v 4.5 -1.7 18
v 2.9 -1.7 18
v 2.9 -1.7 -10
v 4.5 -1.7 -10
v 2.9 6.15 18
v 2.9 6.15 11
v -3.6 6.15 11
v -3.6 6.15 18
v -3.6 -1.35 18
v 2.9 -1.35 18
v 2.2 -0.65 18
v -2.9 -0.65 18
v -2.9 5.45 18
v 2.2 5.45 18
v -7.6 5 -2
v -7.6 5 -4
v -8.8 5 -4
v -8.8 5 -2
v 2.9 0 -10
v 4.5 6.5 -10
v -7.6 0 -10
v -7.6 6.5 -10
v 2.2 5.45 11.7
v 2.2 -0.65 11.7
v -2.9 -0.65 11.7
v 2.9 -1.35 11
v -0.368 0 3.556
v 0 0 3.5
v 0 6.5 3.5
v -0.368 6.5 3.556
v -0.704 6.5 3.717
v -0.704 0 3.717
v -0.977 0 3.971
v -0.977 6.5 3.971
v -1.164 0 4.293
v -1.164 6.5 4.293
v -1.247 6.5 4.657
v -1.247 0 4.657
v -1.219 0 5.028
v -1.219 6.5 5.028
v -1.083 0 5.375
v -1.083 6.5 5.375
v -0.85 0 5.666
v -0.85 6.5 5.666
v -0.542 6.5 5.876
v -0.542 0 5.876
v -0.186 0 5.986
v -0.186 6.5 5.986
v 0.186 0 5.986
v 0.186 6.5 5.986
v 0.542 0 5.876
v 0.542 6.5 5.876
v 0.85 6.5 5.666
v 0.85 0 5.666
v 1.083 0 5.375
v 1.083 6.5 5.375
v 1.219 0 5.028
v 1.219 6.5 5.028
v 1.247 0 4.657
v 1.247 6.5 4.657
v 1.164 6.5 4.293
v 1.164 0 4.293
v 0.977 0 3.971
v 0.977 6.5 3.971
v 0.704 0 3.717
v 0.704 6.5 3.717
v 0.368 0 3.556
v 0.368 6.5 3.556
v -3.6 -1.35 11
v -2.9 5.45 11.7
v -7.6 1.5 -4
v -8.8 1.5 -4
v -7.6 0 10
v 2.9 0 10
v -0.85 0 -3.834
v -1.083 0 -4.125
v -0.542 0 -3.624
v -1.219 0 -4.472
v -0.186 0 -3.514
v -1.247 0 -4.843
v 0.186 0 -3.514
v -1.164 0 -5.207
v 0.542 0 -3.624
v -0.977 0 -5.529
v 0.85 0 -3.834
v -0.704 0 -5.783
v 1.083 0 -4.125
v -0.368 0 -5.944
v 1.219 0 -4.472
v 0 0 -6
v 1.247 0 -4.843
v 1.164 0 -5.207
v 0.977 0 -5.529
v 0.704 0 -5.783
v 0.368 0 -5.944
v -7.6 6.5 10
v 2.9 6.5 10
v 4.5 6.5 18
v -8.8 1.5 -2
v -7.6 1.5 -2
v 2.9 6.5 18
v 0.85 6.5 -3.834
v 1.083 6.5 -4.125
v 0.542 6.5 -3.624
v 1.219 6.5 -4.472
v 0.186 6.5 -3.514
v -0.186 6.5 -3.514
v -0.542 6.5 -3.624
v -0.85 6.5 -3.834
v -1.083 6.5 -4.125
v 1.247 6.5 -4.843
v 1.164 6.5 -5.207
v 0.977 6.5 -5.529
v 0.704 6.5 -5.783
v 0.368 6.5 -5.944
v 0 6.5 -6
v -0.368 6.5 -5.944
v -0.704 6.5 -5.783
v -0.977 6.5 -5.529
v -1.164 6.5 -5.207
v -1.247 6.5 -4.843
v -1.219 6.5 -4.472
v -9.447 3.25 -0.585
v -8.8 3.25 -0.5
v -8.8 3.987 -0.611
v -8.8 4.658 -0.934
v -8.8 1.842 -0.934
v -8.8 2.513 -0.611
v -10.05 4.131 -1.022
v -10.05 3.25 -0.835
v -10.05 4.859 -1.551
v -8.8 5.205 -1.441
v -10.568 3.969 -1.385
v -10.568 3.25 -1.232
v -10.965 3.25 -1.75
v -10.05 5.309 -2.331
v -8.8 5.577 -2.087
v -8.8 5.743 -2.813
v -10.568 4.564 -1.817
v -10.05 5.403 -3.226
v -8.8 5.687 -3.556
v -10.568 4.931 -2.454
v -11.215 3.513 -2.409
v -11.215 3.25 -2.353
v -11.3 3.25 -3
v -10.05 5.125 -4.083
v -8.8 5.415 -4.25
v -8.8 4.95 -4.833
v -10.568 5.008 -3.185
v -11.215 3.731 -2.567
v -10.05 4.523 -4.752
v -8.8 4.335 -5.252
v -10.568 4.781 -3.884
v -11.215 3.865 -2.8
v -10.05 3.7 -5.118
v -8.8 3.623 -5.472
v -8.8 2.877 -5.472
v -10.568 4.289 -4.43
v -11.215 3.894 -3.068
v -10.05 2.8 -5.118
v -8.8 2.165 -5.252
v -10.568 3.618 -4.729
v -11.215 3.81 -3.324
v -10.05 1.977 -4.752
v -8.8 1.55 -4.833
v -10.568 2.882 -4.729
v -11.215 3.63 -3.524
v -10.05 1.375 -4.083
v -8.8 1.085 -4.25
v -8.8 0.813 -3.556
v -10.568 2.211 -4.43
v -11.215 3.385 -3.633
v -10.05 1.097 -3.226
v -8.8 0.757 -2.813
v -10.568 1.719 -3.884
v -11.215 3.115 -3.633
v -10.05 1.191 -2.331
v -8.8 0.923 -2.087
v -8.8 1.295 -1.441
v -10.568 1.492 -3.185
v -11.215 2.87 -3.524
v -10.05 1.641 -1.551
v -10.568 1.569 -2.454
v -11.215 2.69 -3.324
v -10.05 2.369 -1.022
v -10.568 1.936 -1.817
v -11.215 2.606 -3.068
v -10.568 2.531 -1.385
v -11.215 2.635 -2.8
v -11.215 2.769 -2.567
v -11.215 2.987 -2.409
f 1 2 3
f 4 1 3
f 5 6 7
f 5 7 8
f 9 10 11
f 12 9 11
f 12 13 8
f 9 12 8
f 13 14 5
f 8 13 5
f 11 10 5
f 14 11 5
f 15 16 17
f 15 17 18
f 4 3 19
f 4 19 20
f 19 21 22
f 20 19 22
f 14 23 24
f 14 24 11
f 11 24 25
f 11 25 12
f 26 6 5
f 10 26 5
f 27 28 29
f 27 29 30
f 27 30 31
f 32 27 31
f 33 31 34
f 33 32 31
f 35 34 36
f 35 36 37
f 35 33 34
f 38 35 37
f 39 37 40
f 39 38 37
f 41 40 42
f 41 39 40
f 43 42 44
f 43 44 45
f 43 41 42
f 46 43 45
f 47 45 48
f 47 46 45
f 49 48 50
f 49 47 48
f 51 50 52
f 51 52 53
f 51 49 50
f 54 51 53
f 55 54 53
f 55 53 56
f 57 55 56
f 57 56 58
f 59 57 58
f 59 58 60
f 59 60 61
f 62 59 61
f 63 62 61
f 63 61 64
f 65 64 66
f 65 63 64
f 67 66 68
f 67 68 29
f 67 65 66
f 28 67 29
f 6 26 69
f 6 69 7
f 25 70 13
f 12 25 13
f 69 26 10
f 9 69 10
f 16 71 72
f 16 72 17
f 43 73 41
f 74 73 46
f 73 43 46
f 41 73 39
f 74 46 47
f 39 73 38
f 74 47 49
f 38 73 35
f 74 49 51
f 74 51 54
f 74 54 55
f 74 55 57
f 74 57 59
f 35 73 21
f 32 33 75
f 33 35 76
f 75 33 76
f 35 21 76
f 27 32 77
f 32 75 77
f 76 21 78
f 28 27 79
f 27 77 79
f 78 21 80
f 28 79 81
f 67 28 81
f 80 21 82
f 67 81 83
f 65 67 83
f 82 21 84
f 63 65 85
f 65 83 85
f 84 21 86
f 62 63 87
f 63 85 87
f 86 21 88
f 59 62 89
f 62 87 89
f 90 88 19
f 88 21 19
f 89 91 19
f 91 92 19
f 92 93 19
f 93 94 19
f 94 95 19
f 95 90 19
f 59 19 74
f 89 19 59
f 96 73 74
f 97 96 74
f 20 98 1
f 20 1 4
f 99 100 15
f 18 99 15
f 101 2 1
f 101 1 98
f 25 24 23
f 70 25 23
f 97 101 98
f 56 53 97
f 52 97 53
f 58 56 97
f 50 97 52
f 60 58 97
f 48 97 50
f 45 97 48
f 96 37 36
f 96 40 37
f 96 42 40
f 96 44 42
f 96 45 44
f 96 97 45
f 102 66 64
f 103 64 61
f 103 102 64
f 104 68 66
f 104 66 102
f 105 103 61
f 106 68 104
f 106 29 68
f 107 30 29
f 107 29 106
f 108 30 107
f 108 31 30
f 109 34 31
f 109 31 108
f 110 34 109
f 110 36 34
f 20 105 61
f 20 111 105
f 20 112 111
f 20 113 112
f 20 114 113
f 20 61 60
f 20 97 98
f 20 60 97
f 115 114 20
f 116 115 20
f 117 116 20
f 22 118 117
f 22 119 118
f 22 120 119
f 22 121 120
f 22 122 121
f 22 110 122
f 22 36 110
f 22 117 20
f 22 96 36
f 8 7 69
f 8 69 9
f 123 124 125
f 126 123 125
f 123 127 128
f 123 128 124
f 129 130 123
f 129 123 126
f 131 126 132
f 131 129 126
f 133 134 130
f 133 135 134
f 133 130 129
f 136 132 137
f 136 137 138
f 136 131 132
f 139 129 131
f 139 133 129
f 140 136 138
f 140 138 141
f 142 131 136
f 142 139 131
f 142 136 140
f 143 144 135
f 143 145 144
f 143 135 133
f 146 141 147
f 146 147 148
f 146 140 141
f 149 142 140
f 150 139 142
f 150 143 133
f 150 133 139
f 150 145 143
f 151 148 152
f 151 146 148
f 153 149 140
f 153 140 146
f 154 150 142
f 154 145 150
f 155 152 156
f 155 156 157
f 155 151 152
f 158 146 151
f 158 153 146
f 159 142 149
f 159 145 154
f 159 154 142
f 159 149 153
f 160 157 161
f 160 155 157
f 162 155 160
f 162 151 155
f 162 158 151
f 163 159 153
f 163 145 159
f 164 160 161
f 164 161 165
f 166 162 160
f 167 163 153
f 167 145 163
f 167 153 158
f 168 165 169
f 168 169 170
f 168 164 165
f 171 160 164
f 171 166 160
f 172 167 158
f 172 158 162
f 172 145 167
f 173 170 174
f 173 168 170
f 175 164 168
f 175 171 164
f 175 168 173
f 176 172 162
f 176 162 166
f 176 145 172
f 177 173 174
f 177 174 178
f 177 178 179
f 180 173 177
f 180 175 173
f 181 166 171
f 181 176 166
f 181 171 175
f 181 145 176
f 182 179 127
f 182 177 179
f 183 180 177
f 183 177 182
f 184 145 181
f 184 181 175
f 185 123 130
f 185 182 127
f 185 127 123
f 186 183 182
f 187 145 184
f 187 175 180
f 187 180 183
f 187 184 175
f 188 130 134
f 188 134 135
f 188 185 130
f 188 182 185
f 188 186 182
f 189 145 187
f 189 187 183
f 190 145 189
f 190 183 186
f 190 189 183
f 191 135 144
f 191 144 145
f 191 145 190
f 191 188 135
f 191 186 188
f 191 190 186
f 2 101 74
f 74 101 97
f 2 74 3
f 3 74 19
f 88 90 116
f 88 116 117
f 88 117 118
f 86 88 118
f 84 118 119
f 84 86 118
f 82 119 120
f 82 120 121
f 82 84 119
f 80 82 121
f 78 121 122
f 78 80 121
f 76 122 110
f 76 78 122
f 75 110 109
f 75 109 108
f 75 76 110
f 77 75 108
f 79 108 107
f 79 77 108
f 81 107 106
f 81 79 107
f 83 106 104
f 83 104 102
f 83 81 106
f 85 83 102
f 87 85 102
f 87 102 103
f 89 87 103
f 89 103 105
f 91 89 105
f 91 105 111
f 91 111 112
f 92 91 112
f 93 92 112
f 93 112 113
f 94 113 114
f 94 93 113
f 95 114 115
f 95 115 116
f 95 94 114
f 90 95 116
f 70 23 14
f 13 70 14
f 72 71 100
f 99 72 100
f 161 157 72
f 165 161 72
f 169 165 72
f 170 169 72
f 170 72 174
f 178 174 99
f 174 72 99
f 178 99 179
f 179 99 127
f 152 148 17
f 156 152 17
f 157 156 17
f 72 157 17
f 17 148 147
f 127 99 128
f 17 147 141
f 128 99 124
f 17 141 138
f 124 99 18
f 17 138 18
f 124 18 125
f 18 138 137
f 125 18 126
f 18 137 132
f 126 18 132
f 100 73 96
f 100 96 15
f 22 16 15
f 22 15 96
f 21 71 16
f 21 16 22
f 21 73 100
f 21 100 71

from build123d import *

# Parameters (mm, degrees)
SKETCH_1_W      = 10.5
SKETCH_1_H      = 20
SKETCH_1_R      = 1.25
EXTRUDE_1_DEPTH = 6.5
SKETCH_2_W      = 2
SKETCH_2_H      = 3.5
EXTRUDE_2_DEPTH = 1.2
SKETCH_3_R      = 2.5
EXTRUDE_3_DEPTH = 2.5
FILLET_1_R      = 2.5
SKETCH_4_W      = 28
SKETCH_4_H      = 8.2
EXTRUDE_4_DEPTH = 1.6
SKETCH_5_W      = 7
SKETCH_5_H      = 7.5
EXTRUDE_5_DEPTH = 6.5
SHELL_1_T       = -0.7


with BuildPart() as part:
    # 草图1 → 凸台-拉伸1 (new body)
    with BuildSketch(Plane(origin=(0, 0, 0), x_dir=(1, 0, 0), z_dir=(0, 1, 0))):
        with Locations((-2.35, 0)):
            Rectangle(SKETCH_1_W, SKETCH_1_H)
        with Locations(Location((0, 4.75, 0), (0, 0, 90))):
            Circle(SKETCH_1_R, mode=Mode.SUBTRACT)
        with Locations(Location((0, -4.75, 0), (0, 0, 90))):
            Circle(SKETCH_1_R, mode=Mode.SUBTRACT)
    extrude(amount=EXTRUDE_1_DEPTH)

    # 草图2 → 凸台-拉伸2 (add)
    with BuildSketch(Plane.ZY.offset(7.6)):
        with Locations((-3, 3.25)):
            Rectangle(SKETCH_2_W, SKETCH_2_H)
    extrude(amount=EXTRUDE_2_DEPTH)

    # 草图3 → 凸台-拉伸3 (add)
    with BuildSketch(Plane.ZY.offset(8.8)):
        with Locations((-3, 3.25)):
            Circle(SKETCH_3_R)
    extrude(amount=EXTRUDE_3_DEPTH)

    # 圆角1
    fillet_1_edges = [part.edges().sort_by_distance(p)[0] for p in [
        (-11.3, 3.25, -5.5),
    ]]
    fillet(fillet_1_edges, radius=FILLET_1_R - 0.0001)  # a hair under: the kernel refuses the full size

    # 草图4 → 凸台-拉伸4 (add)
    with BuildSketch(Plane(origin=(2.9, 0, 0), x_dir=(0, 0, -1), z_dir=(1, 0, 0))):
        with Locations((-4, 2.4)):
            Rectangle(SKETCH_4_W, SKETCH_4_H)
    extrude(amount=EXTRUDE_4_DEPTH)


with BuildPart() as body_2:
    # 草图5 → 凸台-拉伸5 (new body)
    with BuildSketch(Plane.ZY.offset(-2.9)):
        with Locations((14.5, 2.4)):
            Rectangle(SKETCH_5_W, SKETCH_5_H)
    extrude(amount=EXTRUDE_5_DEPTH)

    # 抽壳1
    shell_1_openings = [body_2.faces().sort_by_distance(p)[0] for p in [
        (-0.35, 2.4, 18),
    ]]
    offset(amount=SHELL_1_T, openings=shell_1_openings, kind=Kind.INTERSECTION)


solid = Compound([part.part, body_2.part])
